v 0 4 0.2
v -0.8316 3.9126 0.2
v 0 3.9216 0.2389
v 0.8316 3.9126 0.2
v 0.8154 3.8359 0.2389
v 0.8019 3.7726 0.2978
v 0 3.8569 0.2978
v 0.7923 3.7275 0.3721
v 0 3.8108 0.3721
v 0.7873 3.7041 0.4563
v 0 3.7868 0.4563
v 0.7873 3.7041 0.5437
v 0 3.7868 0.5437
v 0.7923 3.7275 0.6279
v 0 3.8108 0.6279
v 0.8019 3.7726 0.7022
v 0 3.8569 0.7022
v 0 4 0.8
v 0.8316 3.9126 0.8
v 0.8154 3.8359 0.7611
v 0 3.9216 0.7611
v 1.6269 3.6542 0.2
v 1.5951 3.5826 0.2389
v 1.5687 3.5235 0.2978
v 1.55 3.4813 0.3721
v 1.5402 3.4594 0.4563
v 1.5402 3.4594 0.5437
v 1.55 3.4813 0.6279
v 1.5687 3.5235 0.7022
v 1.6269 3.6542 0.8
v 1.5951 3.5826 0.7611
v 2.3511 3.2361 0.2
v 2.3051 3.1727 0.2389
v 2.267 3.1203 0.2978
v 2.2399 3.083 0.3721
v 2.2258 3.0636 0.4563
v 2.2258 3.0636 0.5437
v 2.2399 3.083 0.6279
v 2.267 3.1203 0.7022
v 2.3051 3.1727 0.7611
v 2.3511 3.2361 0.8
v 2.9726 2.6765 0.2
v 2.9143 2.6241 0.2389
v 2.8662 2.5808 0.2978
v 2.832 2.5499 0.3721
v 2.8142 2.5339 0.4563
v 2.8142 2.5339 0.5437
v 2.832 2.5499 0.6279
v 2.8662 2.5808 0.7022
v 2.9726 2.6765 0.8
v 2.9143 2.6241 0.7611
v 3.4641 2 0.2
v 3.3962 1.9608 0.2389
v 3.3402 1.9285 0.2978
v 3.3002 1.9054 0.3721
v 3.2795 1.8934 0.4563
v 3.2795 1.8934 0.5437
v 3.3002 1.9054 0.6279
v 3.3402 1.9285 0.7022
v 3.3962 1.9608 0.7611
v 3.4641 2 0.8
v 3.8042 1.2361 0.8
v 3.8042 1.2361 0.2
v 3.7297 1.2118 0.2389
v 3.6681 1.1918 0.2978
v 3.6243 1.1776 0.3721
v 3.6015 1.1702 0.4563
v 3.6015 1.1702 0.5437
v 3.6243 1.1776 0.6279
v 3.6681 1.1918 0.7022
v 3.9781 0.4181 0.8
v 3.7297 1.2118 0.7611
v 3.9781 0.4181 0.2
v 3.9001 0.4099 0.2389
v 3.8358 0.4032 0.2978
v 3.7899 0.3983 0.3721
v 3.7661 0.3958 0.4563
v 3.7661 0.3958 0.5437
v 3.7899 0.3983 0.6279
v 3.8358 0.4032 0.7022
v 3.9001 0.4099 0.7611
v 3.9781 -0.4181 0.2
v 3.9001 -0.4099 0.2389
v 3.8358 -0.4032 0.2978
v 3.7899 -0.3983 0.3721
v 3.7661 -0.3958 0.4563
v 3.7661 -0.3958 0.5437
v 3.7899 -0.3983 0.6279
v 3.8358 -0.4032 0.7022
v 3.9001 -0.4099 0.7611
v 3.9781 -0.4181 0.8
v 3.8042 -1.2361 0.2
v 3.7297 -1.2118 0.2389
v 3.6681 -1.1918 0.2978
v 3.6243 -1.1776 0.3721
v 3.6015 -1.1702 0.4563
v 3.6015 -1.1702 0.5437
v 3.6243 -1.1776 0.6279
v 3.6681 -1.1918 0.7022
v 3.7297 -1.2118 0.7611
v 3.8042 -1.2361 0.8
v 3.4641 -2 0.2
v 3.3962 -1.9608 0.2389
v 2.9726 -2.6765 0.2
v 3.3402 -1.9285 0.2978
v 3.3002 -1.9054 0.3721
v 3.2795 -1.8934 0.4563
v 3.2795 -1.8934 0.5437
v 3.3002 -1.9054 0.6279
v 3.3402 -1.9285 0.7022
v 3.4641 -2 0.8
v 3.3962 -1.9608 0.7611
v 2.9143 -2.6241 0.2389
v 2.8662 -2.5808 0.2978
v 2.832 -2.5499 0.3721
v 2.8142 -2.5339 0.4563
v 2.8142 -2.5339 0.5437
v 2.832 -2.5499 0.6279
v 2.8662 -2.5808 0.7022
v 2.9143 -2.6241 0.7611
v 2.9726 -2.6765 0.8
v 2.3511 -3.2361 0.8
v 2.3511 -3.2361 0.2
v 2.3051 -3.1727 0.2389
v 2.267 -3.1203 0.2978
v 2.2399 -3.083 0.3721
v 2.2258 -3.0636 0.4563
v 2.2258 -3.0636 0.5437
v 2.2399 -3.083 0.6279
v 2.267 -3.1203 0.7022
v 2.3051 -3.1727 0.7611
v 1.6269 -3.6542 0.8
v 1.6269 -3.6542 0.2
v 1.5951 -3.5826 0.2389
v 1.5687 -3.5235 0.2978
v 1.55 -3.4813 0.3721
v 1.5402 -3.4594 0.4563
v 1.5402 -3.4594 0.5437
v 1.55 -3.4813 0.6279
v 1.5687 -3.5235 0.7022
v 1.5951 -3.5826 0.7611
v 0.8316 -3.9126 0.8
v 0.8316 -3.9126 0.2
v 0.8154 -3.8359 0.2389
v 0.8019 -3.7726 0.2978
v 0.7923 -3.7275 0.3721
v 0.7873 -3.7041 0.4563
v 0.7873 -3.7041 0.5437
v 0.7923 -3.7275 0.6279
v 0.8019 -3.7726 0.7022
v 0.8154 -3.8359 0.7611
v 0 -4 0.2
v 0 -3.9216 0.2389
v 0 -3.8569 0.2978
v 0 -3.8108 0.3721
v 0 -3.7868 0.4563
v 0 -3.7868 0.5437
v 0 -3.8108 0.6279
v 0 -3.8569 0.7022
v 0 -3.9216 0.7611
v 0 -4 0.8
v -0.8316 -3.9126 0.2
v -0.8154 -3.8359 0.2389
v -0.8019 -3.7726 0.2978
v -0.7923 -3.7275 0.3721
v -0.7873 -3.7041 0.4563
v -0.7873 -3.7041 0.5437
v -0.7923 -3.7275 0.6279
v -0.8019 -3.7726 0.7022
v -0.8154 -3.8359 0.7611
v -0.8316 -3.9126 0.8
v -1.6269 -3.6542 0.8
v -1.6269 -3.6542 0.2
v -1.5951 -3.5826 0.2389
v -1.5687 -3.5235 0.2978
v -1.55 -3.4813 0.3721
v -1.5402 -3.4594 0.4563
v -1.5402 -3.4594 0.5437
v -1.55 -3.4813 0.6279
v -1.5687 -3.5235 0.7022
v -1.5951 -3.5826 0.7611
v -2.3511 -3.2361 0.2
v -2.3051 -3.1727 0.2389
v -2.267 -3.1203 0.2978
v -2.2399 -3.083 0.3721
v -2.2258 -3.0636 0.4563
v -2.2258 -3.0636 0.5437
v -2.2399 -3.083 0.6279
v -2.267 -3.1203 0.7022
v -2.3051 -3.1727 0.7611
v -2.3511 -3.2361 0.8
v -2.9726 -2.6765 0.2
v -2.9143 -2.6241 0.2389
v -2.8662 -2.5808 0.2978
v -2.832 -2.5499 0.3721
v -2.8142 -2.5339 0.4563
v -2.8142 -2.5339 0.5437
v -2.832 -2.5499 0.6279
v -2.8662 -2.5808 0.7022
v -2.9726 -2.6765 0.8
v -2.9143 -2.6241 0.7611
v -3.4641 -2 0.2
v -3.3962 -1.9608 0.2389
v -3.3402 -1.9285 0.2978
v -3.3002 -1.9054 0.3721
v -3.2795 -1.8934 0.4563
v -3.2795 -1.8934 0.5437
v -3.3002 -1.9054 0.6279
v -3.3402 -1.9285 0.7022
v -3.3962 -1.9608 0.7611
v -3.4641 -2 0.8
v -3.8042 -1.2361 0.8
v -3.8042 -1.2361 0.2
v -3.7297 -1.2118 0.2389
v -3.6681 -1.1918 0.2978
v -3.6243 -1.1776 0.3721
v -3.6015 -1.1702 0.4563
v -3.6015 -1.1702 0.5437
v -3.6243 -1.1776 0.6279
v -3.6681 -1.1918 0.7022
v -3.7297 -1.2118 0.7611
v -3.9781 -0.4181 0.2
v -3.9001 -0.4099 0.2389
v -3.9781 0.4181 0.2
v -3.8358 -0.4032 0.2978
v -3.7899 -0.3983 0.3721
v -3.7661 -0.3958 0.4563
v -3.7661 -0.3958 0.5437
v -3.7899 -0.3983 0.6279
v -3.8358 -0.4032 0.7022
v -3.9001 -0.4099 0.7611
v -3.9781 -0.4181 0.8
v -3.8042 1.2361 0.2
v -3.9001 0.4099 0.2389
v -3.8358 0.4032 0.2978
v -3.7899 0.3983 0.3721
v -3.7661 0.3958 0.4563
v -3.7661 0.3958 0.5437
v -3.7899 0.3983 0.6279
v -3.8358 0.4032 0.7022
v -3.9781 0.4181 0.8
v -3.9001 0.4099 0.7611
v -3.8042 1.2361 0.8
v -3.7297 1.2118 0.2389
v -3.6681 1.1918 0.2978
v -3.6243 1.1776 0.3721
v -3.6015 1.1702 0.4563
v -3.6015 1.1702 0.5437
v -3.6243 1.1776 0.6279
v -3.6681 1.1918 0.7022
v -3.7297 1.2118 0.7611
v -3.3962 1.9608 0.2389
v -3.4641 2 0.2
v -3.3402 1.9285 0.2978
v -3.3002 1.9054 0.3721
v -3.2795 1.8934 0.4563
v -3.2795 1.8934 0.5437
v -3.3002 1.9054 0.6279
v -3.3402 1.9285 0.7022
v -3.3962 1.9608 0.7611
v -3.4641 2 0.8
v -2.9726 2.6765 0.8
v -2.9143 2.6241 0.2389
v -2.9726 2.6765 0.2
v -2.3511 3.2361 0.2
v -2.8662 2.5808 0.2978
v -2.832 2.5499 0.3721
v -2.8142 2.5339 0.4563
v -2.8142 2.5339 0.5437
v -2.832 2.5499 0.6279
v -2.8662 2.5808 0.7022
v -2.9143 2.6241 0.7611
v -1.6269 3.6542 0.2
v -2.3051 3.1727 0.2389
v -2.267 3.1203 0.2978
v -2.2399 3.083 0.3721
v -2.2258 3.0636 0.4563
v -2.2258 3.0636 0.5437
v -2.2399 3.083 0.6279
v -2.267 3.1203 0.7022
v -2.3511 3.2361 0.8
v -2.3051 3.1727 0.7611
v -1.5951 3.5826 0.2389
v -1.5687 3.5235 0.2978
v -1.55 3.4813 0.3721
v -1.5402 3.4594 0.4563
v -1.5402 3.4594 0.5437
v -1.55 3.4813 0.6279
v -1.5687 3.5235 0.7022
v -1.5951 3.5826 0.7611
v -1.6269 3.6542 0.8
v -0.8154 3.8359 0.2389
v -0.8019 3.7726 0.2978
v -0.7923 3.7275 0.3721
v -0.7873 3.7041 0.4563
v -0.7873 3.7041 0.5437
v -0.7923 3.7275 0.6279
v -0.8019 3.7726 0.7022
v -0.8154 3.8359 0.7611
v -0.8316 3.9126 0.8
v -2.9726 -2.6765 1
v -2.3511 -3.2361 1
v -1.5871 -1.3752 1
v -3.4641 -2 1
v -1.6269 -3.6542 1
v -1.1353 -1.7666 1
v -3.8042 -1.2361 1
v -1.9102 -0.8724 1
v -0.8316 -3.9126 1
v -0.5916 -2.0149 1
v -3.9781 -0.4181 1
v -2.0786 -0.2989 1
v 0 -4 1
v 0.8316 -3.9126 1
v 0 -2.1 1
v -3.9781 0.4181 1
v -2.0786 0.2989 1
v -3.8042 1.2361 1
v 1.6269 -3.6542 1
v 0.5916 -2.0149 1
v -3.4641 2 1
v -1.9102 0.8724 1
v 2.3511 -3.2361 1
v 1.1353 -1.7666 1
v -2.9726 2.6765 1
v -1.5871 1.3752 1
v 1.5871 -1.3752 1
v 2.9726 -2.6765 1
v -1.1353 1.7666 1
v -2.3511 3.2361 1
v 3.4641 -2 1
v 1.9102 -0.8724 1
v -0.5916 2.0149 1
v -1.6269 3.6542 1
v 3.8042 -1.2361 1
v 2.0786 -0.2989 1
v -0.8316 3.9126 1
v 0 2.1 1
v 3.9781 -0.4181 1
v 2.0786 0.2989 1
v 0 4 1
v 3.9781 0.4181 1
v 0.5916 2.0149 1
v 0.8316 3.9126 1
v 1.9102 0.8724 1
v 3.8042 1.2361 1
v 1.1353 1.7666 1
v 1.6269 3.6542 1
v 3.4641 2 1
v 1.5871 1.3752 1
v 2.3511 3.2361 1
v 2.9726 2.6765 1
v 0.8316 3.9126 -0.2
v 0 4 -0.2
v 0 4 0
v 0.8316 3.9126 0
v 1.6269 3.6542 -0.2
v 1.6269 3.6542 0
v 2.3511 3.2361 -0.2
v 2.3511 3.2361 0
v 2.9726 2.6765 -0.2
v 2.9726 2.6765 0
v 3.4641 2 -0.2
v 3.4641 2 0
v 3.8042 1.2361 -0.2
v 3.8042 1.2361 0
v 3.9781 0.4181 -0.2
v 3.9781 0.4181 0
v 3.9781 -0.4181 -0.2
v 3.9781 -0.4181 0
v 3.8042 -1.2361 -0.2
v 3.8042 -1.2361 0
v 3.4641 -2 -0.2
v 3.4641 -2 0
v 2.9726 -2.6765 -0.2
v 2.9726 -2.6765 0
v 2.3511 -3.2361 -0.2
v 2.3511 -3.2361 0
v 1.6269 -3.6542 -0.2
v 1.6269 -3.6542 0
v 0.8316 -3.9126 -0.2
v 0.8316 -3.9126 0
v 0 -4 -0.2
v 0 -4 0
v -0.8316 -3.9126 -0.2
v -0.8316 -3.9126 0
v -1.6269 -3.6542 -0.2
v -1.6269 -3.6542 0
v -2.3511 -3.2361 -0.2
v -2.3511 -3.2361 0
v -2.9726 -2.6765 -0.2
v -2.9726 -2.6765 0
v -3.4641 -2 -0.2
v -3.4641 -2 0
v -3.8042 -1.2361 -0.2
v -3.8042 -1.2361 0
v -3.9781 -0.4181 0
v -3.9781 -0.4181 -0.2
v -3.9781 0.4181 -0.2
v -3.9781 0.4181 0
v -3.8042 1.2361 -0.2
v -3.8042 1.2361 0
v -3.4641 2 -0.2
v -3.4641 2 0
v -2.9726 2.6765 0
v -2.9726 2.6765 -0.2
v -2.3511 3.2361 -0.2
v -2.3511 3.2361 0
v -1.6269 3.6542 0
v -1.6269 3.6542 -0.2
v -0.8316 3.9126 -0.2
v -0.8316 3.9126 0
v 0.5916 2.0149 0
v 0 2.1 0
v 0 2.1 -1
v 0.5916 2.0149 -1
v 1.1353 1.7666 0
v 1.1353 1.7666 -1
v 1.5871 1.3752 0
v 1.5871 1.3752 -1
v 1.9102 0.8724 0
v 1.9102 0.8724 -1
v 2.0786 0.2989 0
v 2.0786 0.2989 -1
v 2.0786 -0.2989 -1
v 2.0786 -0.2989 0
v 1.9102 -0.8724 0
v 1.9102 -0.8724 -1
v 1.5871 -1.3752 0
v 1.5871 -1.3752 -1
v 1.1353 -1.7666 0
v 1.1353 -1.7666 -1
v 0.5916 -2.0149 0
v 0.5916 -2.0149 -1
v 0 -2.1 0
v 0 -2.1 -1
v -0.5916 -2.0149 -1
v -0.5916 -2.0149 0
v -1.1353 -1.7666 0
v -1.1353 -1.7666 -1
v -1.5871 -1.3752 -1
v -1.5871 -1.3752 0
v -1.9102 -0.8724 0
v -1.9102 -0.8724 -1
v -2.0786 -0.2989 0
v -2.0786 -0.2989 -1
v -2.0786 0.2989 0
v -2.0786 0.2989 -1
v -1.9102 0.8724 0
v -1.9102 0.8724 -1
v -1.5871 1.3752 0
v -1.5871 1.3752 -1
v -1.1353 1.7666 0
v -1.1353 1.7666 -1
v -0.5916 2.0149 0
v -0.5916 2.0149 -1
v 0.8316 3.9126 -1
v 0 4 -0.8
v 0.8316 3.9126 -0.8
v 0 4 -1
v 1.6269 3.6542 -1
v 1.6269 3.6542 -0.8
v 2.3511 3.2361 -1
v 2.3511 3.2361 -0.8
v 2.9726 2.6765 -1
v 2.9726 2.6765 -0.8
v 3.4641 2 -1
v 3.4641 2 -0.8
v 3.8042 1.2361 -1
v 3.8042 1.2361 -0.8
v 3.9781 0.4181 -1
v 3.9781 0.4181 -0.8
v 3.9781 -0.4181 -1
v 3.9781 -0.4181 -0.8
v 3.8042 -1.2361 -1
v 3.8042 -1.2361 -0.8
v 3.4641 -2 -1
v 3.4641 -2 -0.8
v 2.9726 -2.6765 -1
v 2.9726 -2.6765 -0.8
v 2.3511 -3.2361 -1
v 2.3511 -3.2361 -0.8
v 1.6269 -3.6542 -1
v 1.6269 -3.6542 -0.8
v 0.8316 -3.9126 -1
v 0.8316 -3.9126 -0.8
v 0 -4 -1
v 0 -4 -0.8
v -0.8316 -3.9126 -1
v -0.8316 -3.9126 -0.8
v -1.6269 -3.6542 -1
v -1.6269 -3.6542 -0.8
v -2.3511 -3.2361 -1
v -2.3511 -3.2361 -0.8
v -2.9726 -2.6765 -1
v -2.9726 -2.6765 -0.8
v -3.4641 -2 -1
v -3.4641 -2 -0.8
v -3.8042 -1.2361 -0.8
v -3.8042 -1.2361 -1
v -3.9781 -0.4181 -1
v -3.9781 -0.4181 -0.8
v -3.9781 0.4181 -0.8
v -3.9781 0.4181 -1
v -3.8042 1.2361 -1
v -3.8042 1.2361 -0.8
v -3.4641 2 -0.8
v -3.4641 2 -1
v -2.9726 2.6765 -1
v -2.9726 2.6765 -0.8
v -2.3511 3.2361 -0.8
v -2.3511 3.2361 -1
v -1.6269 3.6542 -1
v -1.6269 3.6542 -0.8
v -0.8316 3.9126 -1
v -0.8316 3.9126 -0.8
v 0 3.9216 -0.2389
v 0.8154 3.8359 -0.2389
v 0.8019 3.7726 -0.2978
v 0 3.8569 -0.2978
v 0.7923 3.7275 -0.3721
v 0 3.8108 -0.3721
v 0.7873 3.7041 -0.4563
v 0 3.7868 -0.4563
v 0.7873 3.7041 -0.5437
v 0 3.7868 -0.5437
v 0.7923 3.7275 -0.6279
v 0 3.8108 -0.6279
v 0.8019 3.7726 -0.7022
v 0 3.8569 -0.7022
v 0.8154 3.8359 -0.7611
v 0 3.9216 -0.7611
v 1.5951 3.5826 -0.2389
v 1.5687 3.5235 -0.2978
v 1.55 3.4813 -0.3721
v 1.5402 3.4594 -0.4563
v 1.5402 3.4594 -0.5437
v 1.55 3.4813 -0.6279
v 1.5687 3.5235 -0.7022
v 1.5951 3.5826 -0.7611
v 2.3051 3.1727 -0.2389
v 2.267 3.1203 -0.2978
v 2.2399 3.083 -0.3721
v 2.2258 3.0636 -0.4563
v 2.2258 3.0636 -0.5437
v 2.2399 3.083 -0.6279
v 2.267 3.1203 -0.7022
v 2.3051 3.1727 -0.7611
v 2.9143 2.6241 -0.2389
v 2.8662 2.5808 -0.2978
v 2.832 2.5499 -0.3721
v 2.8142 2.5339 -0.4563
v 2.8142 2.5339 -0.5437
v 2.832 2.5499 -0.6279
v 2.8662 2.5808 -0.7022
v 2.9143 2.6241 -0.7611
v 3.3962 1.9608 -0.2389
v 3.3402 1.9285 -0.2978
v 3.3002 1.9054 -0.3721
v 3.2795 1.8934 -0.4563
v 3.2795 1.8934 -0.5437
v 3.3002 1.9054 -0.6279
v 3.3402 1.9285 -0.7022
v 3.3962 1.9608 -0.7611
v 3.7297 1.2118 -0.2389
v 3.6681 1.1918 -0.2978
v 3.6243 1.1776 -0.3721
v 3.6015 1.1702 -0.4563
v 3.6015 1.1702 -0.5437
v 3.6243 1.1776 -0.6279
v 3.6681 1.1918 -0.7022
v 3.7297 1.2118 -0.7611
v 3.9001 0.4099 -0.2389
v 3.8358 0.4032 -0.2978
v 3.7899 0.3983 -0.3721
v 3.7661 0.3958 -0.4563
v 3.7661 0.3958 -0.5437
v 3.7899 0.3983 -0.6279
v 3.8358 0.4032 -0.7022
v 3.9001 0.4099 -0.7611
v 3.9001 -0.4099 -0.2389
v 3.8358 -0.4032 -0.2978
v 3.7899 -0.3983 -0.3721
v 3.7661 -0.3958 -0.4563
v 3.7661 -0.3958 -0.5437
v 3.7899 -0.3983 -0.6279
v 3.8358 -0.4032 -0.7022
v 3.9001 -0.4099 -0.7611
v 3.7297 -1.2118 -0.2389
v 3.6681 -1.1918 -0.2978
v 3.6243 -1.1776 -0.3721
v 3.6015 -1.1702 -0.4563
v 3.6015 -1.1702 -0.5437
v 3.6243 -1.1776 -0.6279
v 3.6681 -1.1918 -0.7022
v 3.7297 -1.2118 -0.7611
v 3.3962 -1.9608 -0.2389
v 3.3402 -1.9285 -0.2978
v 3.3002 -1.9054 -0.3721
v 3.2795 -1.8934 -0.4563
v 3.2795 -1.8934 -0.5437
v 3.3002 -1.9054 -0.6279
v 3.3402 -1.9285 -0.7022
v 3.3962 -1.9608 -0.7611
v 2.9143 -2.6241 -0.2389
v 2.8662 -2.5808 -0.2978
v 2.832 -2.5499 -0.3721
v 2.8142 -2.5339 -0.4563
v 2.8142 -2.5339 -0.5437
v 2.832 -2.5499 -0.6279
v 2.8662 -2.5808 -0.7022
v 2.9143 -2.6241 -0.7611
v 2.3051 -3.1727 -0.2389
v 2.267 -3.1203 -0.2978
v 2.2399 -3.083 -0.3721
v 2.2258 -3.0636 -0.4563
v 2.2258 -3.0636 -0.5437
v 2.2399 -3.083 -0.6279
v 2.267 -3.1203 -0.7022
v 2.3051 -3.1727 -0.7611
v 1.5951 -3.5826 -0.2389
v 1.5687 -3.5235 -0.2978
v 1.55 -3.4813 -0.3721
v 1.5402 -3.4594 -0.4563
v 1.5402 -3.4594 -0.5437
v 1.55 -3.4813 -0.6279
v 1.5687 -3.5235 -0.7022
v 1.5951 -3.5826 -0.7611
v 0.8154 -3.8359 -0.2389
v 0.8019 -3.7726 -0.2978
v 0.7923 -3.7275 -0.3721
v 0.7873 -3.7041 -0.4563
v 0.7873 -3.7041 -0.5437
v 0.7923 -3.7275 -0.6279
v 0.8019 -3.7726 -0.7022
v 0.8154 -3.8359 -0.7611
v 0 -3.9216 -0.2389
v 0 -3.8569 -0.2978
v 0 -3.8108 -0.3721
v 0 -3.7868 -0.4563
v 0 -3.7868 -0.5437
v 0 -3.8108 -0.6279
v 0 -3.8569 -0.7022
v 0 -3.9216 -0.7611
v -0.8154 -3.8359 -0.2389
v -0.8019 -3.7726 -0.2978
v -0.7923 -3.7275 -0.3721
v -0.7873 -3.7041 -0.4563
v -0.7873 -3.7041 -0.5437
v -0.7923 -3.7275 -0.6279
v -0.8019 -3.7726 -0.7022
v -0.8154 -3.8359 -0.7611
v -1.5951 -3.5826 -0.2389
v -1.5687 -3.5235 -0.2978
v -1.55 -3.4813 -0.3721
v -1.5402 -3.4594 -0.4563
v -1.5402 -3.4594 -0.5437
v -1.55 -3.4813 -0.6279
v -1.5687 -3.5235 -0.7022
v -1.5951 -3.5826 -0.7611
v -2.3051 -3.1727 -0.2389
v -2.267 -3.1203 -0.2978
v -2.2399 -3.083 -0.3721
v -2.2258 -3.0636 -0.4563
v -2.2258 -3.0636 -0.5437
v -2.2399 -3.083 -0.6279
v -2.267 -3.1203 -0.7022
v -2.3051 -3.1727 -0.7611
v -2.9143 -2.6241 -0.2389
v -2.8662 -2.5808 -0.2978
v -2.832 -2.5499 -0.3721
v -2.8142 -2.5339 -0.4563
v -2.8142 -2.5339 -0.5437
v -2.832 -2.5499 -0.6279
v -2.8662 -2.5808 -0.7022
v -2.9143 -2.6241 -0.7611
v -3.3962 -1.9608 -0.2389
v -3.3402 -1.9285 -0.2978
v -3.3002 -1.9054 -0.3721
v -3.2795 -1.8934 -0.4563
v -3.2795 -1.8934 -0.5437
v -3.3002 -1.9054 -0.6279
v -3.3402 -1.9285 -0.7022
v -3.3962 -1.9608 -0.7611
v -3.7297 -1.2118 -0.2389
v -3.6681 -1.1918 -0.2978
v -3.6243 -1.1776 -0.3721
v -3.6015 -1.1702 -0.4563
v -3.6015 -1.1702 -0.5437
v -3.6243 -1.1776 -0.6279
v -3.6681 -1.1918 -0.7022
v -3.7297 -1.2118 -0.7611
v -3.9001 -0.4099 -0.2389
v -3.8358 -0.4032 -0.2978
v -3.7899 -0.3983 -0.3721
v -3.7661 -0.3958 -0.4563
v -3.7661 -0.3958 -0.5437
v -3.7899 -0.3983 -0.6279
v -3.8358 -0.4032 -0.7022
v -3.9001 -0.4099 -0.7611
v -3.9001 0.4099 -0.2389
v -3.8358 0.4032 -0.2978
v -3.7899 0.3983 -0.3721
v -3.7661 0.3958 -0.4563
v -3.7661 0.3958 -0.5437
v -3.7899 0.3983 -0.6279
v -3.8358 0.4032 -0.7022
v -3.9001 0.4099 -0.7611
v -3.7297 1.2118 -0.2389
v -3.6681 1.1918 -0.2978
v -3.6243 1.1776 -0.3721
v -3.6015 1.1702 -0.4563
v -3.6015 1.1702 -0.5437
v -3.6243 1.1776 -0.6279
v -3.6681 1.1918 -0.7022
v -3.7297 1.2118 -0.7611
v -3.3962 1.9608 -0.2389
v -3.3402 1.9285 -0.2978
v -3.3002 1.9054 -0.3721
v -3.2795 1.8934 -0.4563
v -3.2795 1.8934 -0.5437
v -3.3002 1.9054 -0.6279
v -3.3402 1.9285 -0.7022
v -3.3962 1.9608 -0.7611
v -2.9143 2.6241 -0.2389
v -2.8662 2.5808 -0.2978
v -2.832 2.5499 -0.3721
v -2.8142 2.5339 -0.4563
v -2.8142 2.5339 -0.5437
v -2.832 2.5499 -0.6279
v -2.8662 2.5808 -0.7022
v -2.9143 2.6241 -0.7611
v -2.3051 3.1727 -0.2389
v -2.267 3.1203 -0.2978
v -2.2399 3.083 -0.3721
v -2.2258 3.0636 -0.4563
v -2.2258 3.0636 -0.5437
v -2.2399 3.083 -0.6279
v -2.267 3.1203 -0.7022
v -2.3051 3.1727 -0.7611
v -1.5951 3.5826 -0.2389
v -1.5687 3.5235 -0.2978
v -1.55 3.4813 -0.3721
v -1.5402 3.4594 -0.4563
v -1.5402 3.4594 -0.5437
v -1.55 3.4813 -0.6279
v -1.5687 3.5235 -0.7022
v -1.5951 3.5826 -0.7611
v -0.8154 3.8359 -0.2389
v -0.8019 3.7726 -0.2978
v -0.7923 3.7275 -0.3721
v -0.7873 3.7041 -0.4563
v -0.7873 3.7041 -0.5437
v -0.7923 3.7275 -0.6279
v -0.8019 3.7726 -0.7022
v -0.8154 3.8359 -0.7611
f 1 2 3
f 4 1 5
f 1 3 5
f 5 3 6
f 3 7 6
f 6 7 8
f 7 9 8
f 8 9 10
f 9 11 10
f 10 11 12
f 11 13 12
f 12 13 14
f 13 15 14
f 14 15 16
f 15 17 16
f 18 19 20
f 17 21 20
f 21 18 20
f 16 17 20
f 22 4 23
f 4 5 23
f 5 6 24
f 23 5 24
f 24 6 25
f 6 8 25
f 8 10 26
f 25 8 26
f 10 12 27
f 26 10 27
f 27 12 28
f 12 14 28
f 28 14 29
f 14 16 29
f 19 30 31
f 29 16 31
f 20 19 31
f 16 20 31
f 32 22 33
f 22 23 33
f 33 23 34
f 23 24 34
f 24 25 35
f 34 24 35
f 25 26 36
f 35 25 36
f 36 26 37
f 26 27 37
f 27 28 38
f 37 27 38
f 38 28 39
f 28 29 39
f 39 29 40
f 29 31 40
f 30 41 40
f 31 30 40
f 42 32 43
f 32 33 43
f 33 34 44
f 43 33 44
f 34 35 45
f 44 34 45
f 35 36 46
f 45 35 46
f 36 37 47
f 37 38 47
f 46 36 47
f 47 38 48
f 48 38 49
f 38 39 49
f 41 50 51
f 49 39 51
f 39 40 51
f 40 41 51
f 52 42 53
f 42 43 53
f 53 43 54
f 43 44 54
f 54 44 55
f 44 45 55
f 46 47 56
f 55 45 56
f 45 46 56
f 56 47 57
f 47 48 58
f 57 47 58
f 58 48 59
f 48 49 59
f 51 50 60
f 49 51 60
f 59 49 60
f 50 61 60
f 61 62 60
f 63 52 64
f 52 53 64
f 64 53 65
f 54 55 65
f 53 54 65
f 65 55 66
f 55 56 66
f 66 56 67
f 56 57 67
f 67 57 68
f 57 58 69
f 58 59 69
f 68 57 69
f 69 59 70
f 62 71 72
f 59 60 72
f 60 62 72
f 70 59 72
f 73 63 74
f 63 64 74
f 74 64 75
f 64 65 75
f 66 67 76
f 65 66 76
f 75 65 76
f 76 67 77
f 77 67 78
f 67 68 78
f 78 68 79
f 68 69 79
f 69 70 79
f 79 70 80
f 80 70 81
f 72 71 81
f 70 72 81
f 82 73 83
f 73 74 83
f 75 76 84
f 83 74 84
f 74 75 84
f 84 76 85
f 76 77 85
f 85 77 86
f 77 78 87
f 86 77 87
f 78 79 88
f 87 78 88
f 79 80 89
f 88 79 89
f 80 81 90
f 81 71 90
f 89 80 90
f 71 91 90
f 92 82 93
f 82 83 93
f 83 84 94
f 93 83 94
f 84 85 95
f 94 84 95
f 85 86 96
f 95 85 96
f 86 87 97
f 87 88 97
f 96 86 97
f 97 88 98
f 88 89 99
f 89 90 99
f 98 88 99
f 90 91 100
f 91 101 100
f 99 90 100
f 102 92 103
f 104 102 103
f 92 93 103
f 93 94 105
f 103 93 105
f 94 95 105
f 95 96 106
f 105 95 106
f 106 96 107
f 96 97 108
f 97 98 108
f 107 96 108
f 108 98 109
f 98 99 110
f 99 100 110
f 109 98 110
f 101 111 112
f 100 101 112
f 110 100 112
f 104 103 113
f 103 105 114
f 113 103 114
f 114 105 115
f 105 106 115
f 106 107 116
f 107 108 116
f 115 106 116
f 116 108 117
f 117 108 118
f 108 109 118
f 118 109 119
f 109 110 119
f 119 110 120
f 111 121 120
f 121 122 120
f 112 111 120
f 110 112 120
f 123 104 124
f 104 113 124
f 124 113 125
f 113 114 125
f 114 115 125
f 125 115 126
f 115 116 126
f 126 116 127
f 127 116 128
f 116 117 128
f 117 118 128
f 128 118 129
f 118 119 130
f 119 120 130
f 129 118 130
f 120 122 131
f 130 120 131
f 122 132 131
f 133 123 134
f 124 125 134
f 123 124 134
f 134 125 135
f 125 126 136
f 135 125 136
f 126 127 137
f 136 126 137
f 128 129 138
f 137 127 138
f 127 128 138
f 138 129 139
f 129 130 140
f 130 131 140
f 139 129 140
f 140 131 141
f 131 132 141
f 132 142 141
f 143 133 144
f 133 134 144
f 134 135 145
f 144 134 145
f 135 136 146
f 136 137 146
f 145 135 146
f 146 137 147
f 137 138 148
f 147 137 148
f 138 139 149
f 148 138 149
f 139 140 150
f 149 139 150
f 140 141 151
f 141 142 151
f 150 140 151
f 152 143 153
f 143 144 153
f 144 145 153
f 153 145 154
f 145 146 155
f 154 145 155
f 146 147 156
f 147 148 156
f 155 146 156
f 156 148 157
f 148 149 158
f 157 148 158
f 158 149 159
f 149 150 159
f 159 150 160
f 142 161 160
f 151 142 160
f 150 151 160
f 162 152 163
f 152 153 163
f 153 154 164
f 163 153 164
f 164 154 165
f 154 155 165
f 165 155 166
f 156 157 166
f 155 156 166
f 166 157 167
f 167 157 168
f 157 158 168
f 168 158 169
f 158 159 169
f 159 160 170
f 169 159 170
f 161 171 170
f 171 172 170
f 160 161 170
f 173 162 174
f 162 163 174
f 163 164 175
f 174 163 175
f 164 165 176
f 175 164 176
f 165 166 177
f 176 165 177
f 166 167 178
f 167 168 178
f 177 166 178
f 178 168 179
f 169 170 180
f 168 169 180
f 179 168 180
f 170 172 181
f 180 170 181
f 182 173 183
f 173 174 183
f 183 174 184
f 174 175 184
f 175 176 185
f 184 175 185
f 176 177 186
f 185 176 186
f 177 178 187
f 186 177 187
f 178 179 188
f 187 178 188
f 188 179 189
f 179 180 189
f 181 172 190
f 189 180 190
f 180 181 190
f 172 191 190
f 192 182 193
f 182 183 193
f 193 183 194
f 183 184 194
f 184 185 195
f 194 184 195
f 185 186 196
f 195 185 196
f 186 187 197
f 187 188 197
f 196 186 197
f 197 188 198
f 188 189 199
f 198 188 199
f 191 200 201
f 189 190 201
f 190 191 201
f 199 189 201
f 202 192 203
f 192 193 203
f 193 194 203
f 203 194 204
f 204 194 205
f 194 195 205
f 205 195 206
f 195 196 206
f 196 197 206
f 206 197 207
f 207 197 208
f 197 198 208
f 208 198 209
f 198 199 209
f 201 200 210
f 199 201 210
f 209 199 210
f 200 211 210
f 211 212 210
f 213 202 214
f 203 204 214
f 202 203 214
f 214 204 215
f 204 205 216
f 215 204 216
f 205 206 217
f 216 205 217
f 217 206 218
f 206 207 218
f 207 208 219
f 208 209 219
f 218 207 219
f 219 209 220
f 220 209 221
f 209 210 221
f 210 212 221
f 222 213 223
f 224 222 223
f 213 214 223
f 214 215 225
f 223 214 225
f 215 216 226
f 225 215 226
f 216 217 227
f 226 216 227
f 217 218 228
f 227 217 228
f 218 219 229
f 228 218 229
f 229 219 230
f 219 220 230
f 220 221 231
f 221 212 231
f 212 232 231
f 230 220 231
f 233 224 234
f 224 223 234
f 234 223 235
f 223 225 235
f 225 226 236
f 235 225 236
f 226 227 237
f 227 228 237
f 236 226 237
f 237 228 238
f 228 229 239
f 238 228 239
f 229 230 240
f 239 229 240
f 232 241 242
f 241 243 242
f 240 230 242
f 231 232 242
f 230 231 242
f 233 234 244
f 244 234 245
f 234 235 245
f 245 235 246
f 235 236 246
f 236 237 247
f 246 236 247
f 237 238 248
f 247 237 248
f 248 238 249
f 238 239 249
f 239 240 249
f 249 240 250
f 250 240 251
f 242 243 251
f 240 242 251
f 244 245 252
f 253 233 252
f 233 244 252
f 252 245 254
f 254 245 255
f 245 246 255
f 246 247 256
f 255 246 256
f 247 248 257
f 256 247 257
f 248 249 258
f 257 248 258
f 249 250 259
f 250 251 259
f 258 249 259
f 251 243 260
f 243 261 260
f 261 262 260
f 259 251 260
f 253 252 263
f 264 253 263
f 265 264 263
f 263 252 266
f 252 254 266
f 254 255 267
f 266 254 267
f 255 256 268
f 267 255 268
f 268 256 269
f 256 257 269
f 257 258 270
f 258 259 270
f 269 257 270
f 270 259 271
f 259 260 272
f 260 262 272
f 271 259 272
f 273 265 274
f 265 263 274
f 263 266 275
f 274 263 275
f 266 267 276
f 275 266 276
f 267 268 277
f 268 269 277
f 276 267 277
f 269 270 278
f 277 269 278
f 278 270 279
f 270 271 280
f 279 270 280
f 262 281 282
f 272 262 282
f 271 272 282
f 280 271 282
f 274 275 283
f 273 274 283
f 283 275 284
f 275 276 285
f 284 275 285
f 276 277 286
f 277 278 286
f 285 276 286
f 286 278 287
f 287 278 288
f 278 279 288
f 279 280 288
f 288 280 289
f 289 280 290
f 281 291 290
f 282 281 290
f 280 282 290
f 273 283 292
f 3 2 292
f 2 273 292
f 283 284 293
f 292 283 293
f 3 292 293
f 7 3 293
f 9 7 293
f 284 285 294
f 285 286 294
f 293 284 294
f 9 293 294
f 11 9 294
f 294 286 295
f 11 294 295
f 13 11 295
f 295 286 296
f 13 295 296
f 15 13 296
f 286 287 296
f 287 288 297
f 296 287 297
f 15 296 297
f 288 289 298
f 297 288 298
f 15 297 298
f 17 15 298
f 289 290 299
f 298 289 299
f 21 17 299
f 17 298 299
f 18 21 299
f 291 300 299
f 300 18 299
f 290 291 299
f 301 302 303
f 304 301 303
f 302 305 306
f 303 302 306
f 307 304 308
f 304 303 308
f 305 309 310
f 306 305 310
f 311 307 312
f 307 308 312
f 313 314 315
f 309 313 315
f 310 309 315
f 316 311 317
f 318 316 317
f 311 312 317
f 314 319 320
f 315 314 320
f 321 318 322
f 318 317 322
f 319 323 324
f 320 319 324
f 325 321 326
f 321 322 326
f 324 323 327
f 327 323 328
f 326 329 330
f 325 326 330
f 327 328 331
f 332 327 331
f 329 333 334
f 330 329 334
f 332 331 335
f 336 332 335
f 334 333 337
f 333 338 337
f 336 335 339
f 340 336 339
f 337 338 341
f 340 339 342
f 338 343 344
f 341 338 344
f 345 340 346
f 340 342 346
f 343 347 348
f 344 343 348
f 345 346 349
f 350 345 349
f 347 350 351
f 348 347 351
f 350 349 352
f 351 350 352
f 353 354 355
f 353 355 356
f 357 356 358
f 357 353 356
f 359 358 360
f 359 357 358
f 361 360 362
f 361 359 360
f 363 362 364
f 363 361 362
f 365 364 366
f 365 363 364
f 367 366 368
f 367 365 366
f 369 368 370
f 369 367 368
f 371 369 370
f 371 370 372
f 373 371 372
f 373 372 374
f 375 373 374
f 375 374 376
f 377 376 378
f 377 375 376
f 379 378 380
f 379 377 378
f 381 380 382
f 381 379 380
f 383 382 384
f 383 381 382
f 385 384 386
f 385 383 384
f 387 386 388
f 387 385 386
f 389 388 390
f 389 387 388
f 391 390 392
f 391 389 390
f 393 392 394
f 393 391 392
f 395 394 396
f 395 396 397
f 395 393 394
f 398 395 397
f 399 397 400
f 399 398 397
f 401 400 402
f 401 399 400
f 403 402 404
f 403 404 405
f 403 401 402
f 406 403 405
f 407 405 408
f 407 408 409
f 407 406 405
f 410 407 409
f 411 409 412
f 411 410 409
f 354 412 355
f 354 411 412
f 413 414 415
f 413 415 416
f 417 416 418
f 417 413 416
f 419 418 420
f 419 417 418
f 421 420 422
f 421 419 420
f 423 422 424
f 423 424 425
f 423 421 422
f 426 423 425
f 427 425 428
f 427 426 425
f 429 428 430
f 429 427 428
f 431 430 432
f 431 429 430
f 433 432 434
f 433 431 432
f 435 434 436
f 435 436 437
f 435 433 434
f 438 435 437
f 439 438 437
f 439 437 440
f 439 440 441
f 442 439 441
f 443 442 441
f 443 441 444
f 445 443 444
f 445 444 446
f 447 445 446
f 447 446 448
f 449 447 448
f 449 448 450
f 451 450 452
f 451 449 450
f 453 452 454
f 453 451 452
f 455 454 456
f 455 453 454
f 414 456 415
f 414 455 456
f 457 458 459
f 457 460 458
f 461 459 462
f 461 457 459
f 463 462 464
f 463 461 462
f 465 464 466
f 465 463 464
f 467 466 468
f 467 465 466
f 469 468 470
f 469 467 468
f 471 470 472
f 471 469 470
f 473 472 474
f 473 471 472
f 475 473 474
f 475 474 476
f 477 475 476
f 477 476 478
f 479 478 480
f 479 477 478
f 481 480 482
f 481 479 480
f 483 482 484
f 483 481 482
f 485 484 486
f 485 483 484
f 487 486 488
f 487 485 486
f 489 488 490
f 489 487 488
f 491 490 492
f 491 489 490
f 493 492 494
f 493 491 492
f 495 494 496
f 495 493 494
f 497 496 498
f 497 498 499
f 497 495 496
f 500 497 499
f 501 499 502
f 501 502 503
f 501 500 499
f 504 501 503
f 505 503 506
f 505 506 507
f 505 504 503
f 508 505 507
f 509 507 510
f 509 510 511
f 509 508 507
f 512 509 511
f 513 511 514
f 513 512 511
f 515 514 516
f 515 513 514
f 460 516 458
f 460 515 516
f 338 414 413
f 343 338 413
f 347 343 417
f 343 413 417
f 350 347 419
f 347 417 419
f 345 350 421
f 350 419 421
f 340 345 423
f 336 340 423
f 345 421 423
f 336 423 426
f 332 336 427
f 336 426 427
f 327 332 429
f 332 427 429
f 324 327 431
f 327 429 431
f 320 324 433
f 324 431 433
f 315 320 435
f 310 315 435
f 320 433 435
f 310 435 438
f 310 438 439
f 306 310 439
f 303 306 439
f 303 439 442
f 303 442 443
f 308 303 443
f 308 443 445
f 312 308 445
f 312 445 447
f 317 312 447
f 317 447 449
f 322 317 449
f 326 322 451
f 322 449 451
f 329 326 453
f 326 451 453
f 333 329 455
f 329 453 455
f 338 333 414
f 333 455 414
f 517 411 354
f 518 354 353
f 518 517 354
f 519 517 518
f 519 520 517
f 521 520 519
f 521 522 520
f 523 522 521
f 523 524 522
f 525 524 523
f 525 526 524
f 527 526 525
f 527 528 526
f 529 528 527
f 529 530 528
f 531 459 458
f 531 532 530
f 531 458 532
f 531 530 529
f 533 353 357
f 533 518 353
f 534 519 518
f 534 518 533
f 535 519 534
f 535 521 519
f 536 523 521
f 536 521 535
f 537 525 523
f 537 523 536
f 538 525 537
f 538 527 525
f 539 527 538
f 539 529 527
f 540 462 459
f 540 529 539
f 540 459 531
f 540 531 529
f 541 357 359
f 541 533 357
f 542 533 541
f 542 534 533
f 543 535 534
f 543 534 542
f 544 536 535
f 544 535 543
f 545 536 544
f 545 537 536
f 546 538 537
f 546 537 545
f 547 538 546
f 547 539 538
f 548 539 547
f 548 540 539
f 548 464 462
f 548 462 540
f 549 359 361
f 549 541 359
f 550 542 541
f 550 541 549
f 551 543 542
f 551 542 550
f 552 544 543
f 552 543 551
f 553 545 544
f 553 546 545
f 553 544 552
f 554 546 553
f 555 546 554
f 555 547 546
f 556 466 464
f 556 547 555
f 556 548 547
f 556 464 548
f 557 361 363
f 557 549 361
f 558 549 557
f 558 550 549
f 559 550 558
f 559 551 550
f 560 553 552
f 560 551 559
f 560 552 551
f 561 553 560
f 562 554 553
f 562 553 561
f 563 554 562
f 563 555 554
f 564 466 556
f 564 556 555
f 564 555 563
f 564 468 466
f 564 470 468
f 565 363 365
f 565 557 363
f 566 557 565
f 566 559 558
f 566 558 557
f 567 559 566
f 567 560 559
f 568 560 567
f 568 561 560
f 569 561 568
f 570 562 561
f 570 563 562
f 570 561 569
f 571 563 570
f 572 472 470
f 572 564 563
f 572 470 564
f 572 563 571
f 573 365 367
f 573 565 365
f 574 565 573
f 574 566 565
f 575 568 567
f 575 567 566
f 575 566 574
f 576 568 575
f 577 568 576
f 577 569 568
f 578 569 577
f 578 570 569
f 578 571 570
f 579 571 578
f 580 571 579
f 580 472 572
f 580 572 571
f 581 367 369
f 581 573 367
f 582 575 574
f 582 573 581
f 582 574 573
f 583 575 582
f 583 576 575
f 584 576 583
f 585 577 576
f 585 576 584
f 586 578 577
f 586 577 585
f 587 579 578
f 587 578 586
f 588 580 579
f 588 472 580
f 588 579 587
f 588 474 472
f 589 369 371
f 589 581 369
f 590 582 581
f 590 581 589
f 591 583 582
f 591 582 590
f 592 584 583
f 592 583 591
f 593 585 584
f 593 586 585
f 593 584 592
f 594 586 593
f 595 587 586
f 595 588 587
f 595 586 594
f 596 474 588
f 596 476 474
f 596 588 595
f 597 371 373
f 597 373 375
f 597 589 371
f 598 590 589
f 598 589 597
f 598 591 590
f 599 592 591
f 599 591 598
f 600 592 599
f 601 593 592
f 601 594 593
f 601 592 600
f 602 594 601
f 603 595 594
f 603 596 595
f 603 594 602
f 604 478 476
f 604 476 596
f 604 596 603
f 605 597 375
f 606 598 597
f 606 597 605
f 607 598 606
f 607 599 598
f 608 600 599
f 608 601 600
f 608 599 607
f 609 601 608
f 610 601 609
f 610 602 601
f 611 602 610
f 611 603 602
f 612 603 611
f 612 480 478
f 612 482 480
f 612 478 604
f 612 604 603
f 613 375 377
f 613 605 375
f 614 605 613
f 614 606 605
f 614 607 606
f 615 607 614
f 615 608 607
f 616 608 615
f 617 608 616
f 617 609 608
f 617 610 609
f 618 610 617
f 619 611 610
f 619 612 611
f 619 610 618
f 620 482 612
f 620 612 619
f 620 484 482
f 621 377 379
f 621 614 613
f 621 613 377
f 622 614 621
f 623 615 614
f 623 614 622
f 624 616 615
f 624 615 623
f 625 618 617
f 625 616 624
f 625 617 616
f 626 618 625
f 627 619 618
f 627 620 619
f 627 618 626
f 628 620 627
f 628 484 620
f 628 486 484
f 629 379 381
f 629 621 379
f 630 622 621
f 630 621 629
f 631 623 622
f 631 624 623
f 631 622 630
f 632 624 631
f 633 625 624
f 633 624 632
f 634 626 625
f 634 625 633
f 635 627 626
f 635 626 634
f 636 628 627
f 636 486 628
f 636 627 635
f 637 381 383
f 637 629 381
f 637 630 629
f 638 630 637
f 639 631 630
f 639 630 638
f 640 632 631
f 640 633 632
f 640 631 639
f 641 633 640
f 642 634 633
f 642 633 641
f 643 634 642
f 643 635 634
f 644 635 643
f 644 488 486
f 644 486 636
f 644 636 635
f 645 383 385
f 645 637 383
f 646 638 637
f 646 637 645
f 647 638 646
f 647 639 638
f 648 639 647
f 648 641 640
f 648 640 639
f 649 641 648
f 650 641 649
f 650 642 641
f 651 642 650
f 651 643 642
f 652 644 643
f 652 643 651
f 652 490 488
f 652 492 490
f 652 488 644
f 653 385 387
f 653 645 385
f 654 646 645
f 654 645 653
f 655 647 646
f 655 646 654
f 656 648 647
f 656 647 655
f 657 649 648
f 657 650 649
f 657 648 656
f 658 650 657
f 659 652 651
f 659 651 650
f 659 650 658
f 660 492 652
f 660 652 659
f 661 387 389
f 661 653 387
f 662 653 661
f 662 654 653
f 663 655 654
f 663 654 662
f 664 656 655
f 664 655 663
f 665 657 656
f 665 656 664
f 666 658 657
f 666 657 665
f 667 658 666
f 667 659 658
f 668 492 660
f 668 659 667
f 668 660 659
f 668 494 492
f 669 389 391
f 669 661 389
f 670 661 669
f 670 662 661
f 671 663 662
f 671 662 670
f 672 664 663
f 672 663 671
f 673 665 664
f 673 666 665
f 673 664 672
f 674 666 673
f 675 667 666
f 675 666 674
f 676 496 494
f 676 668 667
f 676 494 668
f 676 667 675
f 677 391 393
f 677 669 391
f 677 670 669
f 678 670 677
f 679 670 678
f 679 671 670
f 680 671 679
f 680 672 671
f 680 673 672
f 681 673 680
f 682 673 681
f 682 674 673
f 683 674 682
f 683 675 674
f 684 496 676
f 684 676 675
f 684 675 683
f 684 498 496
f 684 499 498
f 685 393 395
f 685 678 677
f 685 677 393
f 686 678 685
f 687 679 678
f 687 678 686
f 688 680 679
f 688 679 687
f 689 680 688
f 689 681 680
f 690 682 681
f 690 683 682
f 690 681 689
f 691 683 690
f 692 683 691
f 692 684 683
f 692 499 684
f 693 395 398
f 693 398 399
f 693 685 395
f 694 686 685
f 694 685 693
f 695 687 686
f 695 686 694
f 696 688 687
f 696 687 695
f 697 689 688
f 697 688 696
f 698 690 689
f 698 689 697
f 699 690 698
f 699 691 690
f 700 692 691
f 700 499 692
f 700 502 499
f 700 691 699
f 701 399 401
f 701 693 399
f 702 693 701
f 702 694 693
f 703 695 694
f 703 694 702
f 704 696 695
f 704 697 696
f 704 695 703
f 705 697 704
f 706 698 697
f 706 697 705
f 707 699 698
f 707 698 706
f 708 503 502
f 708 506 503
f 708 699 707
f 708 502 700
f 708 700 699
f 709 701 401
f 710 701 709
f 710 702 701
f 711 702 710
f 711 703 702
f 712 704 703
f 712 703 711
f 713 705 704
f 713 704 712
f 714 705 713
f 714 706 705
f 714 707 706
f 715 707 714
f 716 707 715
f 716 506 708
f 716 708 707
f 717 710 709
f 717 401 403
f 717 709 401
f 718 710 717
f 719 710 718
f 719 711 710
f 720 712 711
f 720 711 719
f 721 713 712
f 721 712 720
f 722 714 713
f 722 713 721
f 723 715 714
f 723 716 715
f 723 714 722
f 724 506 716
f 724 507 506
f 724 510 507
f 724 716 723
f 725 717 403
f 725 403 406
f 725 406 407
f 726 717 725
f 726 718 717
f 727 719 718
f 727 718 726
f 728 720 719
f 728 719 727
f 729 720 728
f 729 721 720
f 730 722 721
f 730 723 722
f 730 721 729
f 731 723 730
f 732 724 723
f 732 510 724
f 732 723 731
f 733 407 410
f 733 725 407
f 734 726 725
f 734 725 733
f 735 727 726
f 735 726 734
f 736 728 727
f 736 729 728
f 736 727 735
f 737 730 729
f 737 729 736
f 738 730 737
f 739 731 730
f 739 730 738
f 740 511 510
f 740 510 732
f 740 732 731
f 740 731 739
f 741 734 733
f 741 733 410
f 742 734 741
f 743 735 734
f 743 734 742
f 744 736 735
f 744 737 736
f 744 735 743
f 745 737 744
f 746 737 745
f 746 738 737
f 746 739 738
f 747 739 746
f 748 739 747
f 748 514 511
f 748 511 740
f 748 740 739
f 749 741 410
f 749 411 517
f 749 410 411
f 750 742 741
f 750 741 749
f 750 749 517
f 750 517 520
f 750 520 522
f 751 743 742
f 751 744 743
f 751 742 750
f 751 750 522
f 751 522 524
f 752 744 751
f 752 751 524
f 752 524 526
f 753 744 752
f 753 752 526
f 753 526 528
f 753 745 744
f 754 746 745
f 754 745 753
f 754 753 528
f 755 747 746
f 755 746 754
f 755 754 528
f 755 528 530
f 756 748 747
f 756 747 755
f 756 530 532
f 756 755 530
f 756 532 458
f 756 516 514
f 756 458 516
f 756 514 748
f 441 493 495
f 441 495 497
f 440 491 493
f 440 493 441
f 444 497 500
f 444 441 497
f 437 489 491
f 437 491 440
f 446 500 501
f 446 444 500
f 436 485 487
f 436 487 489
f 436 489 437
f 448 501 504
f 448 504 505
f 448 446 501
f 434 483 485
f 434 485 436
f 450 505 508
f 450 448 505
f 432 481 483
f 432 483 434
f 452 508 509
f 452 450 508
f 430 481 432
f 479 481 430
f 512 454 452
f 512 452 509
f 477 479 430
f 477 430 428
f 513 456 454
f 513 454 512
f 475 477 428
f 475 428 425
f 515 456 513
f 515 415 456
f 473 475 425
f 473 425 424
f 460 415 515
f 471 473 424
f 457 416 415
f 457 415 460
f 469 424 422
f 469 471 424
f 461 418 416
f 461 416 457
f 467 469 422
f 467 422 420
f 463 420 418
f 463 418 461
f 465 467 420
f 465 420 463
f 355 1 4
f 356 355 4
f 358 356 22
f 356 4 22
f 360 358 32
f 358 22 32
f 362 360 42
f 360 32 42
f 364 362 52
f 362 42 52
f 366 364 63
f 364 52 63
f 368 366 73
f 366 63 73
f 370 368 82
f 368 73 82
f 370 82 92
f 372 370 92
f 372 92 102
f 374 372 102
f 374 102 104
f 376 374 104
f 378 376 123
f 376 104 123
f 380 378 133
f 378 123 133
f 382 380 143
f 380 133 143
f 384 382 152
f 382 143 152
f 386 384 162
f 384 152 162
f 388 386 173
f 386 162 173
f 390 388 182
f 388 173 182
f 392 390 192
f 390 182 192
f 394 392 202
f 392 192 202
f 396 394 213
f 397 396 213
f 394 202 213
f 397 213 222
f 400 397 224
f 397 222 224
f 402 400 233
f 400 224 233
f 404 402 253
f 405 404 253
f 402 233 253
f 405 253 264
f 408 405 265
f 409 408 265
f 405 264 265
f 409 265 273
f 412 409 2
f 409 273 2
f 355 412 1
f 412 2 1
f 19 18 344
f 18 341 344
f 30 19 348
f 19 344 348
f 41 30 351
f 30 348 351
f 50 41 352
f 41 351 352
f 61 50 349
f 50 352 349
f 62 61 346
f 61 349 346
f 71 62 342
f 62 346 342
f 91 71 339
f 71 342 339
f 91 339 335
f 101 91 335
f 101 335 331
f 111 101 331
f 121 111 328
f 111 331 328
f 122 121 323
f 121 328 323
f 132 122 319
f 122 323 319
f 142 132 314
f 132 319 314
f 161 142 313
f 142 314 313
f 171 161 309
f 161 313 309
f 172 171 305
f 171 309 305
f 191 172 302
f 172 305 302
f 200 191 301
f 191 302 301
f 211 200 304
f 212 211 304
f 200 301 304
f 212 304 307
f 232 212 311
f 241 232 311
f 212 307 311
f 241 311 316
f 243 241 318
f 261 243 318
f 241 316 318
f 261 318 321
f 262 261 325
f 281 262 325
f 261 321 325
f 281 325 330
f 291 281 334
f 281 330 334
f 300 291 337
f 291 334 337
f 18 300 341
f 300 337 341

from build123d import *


with BuildPart() as part:
    # Sketch2 → Revolve1 (revolve)
    with BuildSketch(Plane(origin=(0, 0, 0), x_dir=(0, 0, -1), z_dir=(1, 0, 0))):
        with BuildLine():
            Line((0, 2.1), (0, 4))
            Line((0, 4), (-0.2, 4))
            ThreePointArc((-0.2, 4), (-0.5, 3.783772234), (-0.8, 4))
            Line((-0.8, 4), (-1, 4))
            Line((-1, 4), (-1, 2.1))
            Line((-1, 2.1), (0, 2.1))
        make_face()
    revolve1 = revolve(axis=Axis((0, 0, 3.014677367), (0, 0, -1)))

    # Mirror2: Revolve1 across plane
    add(revolve1.mirror(Plane(origin=(0, 0, 0), x_dir=(1, 0, 0), z_dir=(0, 0, -1))))


solid = part.part
